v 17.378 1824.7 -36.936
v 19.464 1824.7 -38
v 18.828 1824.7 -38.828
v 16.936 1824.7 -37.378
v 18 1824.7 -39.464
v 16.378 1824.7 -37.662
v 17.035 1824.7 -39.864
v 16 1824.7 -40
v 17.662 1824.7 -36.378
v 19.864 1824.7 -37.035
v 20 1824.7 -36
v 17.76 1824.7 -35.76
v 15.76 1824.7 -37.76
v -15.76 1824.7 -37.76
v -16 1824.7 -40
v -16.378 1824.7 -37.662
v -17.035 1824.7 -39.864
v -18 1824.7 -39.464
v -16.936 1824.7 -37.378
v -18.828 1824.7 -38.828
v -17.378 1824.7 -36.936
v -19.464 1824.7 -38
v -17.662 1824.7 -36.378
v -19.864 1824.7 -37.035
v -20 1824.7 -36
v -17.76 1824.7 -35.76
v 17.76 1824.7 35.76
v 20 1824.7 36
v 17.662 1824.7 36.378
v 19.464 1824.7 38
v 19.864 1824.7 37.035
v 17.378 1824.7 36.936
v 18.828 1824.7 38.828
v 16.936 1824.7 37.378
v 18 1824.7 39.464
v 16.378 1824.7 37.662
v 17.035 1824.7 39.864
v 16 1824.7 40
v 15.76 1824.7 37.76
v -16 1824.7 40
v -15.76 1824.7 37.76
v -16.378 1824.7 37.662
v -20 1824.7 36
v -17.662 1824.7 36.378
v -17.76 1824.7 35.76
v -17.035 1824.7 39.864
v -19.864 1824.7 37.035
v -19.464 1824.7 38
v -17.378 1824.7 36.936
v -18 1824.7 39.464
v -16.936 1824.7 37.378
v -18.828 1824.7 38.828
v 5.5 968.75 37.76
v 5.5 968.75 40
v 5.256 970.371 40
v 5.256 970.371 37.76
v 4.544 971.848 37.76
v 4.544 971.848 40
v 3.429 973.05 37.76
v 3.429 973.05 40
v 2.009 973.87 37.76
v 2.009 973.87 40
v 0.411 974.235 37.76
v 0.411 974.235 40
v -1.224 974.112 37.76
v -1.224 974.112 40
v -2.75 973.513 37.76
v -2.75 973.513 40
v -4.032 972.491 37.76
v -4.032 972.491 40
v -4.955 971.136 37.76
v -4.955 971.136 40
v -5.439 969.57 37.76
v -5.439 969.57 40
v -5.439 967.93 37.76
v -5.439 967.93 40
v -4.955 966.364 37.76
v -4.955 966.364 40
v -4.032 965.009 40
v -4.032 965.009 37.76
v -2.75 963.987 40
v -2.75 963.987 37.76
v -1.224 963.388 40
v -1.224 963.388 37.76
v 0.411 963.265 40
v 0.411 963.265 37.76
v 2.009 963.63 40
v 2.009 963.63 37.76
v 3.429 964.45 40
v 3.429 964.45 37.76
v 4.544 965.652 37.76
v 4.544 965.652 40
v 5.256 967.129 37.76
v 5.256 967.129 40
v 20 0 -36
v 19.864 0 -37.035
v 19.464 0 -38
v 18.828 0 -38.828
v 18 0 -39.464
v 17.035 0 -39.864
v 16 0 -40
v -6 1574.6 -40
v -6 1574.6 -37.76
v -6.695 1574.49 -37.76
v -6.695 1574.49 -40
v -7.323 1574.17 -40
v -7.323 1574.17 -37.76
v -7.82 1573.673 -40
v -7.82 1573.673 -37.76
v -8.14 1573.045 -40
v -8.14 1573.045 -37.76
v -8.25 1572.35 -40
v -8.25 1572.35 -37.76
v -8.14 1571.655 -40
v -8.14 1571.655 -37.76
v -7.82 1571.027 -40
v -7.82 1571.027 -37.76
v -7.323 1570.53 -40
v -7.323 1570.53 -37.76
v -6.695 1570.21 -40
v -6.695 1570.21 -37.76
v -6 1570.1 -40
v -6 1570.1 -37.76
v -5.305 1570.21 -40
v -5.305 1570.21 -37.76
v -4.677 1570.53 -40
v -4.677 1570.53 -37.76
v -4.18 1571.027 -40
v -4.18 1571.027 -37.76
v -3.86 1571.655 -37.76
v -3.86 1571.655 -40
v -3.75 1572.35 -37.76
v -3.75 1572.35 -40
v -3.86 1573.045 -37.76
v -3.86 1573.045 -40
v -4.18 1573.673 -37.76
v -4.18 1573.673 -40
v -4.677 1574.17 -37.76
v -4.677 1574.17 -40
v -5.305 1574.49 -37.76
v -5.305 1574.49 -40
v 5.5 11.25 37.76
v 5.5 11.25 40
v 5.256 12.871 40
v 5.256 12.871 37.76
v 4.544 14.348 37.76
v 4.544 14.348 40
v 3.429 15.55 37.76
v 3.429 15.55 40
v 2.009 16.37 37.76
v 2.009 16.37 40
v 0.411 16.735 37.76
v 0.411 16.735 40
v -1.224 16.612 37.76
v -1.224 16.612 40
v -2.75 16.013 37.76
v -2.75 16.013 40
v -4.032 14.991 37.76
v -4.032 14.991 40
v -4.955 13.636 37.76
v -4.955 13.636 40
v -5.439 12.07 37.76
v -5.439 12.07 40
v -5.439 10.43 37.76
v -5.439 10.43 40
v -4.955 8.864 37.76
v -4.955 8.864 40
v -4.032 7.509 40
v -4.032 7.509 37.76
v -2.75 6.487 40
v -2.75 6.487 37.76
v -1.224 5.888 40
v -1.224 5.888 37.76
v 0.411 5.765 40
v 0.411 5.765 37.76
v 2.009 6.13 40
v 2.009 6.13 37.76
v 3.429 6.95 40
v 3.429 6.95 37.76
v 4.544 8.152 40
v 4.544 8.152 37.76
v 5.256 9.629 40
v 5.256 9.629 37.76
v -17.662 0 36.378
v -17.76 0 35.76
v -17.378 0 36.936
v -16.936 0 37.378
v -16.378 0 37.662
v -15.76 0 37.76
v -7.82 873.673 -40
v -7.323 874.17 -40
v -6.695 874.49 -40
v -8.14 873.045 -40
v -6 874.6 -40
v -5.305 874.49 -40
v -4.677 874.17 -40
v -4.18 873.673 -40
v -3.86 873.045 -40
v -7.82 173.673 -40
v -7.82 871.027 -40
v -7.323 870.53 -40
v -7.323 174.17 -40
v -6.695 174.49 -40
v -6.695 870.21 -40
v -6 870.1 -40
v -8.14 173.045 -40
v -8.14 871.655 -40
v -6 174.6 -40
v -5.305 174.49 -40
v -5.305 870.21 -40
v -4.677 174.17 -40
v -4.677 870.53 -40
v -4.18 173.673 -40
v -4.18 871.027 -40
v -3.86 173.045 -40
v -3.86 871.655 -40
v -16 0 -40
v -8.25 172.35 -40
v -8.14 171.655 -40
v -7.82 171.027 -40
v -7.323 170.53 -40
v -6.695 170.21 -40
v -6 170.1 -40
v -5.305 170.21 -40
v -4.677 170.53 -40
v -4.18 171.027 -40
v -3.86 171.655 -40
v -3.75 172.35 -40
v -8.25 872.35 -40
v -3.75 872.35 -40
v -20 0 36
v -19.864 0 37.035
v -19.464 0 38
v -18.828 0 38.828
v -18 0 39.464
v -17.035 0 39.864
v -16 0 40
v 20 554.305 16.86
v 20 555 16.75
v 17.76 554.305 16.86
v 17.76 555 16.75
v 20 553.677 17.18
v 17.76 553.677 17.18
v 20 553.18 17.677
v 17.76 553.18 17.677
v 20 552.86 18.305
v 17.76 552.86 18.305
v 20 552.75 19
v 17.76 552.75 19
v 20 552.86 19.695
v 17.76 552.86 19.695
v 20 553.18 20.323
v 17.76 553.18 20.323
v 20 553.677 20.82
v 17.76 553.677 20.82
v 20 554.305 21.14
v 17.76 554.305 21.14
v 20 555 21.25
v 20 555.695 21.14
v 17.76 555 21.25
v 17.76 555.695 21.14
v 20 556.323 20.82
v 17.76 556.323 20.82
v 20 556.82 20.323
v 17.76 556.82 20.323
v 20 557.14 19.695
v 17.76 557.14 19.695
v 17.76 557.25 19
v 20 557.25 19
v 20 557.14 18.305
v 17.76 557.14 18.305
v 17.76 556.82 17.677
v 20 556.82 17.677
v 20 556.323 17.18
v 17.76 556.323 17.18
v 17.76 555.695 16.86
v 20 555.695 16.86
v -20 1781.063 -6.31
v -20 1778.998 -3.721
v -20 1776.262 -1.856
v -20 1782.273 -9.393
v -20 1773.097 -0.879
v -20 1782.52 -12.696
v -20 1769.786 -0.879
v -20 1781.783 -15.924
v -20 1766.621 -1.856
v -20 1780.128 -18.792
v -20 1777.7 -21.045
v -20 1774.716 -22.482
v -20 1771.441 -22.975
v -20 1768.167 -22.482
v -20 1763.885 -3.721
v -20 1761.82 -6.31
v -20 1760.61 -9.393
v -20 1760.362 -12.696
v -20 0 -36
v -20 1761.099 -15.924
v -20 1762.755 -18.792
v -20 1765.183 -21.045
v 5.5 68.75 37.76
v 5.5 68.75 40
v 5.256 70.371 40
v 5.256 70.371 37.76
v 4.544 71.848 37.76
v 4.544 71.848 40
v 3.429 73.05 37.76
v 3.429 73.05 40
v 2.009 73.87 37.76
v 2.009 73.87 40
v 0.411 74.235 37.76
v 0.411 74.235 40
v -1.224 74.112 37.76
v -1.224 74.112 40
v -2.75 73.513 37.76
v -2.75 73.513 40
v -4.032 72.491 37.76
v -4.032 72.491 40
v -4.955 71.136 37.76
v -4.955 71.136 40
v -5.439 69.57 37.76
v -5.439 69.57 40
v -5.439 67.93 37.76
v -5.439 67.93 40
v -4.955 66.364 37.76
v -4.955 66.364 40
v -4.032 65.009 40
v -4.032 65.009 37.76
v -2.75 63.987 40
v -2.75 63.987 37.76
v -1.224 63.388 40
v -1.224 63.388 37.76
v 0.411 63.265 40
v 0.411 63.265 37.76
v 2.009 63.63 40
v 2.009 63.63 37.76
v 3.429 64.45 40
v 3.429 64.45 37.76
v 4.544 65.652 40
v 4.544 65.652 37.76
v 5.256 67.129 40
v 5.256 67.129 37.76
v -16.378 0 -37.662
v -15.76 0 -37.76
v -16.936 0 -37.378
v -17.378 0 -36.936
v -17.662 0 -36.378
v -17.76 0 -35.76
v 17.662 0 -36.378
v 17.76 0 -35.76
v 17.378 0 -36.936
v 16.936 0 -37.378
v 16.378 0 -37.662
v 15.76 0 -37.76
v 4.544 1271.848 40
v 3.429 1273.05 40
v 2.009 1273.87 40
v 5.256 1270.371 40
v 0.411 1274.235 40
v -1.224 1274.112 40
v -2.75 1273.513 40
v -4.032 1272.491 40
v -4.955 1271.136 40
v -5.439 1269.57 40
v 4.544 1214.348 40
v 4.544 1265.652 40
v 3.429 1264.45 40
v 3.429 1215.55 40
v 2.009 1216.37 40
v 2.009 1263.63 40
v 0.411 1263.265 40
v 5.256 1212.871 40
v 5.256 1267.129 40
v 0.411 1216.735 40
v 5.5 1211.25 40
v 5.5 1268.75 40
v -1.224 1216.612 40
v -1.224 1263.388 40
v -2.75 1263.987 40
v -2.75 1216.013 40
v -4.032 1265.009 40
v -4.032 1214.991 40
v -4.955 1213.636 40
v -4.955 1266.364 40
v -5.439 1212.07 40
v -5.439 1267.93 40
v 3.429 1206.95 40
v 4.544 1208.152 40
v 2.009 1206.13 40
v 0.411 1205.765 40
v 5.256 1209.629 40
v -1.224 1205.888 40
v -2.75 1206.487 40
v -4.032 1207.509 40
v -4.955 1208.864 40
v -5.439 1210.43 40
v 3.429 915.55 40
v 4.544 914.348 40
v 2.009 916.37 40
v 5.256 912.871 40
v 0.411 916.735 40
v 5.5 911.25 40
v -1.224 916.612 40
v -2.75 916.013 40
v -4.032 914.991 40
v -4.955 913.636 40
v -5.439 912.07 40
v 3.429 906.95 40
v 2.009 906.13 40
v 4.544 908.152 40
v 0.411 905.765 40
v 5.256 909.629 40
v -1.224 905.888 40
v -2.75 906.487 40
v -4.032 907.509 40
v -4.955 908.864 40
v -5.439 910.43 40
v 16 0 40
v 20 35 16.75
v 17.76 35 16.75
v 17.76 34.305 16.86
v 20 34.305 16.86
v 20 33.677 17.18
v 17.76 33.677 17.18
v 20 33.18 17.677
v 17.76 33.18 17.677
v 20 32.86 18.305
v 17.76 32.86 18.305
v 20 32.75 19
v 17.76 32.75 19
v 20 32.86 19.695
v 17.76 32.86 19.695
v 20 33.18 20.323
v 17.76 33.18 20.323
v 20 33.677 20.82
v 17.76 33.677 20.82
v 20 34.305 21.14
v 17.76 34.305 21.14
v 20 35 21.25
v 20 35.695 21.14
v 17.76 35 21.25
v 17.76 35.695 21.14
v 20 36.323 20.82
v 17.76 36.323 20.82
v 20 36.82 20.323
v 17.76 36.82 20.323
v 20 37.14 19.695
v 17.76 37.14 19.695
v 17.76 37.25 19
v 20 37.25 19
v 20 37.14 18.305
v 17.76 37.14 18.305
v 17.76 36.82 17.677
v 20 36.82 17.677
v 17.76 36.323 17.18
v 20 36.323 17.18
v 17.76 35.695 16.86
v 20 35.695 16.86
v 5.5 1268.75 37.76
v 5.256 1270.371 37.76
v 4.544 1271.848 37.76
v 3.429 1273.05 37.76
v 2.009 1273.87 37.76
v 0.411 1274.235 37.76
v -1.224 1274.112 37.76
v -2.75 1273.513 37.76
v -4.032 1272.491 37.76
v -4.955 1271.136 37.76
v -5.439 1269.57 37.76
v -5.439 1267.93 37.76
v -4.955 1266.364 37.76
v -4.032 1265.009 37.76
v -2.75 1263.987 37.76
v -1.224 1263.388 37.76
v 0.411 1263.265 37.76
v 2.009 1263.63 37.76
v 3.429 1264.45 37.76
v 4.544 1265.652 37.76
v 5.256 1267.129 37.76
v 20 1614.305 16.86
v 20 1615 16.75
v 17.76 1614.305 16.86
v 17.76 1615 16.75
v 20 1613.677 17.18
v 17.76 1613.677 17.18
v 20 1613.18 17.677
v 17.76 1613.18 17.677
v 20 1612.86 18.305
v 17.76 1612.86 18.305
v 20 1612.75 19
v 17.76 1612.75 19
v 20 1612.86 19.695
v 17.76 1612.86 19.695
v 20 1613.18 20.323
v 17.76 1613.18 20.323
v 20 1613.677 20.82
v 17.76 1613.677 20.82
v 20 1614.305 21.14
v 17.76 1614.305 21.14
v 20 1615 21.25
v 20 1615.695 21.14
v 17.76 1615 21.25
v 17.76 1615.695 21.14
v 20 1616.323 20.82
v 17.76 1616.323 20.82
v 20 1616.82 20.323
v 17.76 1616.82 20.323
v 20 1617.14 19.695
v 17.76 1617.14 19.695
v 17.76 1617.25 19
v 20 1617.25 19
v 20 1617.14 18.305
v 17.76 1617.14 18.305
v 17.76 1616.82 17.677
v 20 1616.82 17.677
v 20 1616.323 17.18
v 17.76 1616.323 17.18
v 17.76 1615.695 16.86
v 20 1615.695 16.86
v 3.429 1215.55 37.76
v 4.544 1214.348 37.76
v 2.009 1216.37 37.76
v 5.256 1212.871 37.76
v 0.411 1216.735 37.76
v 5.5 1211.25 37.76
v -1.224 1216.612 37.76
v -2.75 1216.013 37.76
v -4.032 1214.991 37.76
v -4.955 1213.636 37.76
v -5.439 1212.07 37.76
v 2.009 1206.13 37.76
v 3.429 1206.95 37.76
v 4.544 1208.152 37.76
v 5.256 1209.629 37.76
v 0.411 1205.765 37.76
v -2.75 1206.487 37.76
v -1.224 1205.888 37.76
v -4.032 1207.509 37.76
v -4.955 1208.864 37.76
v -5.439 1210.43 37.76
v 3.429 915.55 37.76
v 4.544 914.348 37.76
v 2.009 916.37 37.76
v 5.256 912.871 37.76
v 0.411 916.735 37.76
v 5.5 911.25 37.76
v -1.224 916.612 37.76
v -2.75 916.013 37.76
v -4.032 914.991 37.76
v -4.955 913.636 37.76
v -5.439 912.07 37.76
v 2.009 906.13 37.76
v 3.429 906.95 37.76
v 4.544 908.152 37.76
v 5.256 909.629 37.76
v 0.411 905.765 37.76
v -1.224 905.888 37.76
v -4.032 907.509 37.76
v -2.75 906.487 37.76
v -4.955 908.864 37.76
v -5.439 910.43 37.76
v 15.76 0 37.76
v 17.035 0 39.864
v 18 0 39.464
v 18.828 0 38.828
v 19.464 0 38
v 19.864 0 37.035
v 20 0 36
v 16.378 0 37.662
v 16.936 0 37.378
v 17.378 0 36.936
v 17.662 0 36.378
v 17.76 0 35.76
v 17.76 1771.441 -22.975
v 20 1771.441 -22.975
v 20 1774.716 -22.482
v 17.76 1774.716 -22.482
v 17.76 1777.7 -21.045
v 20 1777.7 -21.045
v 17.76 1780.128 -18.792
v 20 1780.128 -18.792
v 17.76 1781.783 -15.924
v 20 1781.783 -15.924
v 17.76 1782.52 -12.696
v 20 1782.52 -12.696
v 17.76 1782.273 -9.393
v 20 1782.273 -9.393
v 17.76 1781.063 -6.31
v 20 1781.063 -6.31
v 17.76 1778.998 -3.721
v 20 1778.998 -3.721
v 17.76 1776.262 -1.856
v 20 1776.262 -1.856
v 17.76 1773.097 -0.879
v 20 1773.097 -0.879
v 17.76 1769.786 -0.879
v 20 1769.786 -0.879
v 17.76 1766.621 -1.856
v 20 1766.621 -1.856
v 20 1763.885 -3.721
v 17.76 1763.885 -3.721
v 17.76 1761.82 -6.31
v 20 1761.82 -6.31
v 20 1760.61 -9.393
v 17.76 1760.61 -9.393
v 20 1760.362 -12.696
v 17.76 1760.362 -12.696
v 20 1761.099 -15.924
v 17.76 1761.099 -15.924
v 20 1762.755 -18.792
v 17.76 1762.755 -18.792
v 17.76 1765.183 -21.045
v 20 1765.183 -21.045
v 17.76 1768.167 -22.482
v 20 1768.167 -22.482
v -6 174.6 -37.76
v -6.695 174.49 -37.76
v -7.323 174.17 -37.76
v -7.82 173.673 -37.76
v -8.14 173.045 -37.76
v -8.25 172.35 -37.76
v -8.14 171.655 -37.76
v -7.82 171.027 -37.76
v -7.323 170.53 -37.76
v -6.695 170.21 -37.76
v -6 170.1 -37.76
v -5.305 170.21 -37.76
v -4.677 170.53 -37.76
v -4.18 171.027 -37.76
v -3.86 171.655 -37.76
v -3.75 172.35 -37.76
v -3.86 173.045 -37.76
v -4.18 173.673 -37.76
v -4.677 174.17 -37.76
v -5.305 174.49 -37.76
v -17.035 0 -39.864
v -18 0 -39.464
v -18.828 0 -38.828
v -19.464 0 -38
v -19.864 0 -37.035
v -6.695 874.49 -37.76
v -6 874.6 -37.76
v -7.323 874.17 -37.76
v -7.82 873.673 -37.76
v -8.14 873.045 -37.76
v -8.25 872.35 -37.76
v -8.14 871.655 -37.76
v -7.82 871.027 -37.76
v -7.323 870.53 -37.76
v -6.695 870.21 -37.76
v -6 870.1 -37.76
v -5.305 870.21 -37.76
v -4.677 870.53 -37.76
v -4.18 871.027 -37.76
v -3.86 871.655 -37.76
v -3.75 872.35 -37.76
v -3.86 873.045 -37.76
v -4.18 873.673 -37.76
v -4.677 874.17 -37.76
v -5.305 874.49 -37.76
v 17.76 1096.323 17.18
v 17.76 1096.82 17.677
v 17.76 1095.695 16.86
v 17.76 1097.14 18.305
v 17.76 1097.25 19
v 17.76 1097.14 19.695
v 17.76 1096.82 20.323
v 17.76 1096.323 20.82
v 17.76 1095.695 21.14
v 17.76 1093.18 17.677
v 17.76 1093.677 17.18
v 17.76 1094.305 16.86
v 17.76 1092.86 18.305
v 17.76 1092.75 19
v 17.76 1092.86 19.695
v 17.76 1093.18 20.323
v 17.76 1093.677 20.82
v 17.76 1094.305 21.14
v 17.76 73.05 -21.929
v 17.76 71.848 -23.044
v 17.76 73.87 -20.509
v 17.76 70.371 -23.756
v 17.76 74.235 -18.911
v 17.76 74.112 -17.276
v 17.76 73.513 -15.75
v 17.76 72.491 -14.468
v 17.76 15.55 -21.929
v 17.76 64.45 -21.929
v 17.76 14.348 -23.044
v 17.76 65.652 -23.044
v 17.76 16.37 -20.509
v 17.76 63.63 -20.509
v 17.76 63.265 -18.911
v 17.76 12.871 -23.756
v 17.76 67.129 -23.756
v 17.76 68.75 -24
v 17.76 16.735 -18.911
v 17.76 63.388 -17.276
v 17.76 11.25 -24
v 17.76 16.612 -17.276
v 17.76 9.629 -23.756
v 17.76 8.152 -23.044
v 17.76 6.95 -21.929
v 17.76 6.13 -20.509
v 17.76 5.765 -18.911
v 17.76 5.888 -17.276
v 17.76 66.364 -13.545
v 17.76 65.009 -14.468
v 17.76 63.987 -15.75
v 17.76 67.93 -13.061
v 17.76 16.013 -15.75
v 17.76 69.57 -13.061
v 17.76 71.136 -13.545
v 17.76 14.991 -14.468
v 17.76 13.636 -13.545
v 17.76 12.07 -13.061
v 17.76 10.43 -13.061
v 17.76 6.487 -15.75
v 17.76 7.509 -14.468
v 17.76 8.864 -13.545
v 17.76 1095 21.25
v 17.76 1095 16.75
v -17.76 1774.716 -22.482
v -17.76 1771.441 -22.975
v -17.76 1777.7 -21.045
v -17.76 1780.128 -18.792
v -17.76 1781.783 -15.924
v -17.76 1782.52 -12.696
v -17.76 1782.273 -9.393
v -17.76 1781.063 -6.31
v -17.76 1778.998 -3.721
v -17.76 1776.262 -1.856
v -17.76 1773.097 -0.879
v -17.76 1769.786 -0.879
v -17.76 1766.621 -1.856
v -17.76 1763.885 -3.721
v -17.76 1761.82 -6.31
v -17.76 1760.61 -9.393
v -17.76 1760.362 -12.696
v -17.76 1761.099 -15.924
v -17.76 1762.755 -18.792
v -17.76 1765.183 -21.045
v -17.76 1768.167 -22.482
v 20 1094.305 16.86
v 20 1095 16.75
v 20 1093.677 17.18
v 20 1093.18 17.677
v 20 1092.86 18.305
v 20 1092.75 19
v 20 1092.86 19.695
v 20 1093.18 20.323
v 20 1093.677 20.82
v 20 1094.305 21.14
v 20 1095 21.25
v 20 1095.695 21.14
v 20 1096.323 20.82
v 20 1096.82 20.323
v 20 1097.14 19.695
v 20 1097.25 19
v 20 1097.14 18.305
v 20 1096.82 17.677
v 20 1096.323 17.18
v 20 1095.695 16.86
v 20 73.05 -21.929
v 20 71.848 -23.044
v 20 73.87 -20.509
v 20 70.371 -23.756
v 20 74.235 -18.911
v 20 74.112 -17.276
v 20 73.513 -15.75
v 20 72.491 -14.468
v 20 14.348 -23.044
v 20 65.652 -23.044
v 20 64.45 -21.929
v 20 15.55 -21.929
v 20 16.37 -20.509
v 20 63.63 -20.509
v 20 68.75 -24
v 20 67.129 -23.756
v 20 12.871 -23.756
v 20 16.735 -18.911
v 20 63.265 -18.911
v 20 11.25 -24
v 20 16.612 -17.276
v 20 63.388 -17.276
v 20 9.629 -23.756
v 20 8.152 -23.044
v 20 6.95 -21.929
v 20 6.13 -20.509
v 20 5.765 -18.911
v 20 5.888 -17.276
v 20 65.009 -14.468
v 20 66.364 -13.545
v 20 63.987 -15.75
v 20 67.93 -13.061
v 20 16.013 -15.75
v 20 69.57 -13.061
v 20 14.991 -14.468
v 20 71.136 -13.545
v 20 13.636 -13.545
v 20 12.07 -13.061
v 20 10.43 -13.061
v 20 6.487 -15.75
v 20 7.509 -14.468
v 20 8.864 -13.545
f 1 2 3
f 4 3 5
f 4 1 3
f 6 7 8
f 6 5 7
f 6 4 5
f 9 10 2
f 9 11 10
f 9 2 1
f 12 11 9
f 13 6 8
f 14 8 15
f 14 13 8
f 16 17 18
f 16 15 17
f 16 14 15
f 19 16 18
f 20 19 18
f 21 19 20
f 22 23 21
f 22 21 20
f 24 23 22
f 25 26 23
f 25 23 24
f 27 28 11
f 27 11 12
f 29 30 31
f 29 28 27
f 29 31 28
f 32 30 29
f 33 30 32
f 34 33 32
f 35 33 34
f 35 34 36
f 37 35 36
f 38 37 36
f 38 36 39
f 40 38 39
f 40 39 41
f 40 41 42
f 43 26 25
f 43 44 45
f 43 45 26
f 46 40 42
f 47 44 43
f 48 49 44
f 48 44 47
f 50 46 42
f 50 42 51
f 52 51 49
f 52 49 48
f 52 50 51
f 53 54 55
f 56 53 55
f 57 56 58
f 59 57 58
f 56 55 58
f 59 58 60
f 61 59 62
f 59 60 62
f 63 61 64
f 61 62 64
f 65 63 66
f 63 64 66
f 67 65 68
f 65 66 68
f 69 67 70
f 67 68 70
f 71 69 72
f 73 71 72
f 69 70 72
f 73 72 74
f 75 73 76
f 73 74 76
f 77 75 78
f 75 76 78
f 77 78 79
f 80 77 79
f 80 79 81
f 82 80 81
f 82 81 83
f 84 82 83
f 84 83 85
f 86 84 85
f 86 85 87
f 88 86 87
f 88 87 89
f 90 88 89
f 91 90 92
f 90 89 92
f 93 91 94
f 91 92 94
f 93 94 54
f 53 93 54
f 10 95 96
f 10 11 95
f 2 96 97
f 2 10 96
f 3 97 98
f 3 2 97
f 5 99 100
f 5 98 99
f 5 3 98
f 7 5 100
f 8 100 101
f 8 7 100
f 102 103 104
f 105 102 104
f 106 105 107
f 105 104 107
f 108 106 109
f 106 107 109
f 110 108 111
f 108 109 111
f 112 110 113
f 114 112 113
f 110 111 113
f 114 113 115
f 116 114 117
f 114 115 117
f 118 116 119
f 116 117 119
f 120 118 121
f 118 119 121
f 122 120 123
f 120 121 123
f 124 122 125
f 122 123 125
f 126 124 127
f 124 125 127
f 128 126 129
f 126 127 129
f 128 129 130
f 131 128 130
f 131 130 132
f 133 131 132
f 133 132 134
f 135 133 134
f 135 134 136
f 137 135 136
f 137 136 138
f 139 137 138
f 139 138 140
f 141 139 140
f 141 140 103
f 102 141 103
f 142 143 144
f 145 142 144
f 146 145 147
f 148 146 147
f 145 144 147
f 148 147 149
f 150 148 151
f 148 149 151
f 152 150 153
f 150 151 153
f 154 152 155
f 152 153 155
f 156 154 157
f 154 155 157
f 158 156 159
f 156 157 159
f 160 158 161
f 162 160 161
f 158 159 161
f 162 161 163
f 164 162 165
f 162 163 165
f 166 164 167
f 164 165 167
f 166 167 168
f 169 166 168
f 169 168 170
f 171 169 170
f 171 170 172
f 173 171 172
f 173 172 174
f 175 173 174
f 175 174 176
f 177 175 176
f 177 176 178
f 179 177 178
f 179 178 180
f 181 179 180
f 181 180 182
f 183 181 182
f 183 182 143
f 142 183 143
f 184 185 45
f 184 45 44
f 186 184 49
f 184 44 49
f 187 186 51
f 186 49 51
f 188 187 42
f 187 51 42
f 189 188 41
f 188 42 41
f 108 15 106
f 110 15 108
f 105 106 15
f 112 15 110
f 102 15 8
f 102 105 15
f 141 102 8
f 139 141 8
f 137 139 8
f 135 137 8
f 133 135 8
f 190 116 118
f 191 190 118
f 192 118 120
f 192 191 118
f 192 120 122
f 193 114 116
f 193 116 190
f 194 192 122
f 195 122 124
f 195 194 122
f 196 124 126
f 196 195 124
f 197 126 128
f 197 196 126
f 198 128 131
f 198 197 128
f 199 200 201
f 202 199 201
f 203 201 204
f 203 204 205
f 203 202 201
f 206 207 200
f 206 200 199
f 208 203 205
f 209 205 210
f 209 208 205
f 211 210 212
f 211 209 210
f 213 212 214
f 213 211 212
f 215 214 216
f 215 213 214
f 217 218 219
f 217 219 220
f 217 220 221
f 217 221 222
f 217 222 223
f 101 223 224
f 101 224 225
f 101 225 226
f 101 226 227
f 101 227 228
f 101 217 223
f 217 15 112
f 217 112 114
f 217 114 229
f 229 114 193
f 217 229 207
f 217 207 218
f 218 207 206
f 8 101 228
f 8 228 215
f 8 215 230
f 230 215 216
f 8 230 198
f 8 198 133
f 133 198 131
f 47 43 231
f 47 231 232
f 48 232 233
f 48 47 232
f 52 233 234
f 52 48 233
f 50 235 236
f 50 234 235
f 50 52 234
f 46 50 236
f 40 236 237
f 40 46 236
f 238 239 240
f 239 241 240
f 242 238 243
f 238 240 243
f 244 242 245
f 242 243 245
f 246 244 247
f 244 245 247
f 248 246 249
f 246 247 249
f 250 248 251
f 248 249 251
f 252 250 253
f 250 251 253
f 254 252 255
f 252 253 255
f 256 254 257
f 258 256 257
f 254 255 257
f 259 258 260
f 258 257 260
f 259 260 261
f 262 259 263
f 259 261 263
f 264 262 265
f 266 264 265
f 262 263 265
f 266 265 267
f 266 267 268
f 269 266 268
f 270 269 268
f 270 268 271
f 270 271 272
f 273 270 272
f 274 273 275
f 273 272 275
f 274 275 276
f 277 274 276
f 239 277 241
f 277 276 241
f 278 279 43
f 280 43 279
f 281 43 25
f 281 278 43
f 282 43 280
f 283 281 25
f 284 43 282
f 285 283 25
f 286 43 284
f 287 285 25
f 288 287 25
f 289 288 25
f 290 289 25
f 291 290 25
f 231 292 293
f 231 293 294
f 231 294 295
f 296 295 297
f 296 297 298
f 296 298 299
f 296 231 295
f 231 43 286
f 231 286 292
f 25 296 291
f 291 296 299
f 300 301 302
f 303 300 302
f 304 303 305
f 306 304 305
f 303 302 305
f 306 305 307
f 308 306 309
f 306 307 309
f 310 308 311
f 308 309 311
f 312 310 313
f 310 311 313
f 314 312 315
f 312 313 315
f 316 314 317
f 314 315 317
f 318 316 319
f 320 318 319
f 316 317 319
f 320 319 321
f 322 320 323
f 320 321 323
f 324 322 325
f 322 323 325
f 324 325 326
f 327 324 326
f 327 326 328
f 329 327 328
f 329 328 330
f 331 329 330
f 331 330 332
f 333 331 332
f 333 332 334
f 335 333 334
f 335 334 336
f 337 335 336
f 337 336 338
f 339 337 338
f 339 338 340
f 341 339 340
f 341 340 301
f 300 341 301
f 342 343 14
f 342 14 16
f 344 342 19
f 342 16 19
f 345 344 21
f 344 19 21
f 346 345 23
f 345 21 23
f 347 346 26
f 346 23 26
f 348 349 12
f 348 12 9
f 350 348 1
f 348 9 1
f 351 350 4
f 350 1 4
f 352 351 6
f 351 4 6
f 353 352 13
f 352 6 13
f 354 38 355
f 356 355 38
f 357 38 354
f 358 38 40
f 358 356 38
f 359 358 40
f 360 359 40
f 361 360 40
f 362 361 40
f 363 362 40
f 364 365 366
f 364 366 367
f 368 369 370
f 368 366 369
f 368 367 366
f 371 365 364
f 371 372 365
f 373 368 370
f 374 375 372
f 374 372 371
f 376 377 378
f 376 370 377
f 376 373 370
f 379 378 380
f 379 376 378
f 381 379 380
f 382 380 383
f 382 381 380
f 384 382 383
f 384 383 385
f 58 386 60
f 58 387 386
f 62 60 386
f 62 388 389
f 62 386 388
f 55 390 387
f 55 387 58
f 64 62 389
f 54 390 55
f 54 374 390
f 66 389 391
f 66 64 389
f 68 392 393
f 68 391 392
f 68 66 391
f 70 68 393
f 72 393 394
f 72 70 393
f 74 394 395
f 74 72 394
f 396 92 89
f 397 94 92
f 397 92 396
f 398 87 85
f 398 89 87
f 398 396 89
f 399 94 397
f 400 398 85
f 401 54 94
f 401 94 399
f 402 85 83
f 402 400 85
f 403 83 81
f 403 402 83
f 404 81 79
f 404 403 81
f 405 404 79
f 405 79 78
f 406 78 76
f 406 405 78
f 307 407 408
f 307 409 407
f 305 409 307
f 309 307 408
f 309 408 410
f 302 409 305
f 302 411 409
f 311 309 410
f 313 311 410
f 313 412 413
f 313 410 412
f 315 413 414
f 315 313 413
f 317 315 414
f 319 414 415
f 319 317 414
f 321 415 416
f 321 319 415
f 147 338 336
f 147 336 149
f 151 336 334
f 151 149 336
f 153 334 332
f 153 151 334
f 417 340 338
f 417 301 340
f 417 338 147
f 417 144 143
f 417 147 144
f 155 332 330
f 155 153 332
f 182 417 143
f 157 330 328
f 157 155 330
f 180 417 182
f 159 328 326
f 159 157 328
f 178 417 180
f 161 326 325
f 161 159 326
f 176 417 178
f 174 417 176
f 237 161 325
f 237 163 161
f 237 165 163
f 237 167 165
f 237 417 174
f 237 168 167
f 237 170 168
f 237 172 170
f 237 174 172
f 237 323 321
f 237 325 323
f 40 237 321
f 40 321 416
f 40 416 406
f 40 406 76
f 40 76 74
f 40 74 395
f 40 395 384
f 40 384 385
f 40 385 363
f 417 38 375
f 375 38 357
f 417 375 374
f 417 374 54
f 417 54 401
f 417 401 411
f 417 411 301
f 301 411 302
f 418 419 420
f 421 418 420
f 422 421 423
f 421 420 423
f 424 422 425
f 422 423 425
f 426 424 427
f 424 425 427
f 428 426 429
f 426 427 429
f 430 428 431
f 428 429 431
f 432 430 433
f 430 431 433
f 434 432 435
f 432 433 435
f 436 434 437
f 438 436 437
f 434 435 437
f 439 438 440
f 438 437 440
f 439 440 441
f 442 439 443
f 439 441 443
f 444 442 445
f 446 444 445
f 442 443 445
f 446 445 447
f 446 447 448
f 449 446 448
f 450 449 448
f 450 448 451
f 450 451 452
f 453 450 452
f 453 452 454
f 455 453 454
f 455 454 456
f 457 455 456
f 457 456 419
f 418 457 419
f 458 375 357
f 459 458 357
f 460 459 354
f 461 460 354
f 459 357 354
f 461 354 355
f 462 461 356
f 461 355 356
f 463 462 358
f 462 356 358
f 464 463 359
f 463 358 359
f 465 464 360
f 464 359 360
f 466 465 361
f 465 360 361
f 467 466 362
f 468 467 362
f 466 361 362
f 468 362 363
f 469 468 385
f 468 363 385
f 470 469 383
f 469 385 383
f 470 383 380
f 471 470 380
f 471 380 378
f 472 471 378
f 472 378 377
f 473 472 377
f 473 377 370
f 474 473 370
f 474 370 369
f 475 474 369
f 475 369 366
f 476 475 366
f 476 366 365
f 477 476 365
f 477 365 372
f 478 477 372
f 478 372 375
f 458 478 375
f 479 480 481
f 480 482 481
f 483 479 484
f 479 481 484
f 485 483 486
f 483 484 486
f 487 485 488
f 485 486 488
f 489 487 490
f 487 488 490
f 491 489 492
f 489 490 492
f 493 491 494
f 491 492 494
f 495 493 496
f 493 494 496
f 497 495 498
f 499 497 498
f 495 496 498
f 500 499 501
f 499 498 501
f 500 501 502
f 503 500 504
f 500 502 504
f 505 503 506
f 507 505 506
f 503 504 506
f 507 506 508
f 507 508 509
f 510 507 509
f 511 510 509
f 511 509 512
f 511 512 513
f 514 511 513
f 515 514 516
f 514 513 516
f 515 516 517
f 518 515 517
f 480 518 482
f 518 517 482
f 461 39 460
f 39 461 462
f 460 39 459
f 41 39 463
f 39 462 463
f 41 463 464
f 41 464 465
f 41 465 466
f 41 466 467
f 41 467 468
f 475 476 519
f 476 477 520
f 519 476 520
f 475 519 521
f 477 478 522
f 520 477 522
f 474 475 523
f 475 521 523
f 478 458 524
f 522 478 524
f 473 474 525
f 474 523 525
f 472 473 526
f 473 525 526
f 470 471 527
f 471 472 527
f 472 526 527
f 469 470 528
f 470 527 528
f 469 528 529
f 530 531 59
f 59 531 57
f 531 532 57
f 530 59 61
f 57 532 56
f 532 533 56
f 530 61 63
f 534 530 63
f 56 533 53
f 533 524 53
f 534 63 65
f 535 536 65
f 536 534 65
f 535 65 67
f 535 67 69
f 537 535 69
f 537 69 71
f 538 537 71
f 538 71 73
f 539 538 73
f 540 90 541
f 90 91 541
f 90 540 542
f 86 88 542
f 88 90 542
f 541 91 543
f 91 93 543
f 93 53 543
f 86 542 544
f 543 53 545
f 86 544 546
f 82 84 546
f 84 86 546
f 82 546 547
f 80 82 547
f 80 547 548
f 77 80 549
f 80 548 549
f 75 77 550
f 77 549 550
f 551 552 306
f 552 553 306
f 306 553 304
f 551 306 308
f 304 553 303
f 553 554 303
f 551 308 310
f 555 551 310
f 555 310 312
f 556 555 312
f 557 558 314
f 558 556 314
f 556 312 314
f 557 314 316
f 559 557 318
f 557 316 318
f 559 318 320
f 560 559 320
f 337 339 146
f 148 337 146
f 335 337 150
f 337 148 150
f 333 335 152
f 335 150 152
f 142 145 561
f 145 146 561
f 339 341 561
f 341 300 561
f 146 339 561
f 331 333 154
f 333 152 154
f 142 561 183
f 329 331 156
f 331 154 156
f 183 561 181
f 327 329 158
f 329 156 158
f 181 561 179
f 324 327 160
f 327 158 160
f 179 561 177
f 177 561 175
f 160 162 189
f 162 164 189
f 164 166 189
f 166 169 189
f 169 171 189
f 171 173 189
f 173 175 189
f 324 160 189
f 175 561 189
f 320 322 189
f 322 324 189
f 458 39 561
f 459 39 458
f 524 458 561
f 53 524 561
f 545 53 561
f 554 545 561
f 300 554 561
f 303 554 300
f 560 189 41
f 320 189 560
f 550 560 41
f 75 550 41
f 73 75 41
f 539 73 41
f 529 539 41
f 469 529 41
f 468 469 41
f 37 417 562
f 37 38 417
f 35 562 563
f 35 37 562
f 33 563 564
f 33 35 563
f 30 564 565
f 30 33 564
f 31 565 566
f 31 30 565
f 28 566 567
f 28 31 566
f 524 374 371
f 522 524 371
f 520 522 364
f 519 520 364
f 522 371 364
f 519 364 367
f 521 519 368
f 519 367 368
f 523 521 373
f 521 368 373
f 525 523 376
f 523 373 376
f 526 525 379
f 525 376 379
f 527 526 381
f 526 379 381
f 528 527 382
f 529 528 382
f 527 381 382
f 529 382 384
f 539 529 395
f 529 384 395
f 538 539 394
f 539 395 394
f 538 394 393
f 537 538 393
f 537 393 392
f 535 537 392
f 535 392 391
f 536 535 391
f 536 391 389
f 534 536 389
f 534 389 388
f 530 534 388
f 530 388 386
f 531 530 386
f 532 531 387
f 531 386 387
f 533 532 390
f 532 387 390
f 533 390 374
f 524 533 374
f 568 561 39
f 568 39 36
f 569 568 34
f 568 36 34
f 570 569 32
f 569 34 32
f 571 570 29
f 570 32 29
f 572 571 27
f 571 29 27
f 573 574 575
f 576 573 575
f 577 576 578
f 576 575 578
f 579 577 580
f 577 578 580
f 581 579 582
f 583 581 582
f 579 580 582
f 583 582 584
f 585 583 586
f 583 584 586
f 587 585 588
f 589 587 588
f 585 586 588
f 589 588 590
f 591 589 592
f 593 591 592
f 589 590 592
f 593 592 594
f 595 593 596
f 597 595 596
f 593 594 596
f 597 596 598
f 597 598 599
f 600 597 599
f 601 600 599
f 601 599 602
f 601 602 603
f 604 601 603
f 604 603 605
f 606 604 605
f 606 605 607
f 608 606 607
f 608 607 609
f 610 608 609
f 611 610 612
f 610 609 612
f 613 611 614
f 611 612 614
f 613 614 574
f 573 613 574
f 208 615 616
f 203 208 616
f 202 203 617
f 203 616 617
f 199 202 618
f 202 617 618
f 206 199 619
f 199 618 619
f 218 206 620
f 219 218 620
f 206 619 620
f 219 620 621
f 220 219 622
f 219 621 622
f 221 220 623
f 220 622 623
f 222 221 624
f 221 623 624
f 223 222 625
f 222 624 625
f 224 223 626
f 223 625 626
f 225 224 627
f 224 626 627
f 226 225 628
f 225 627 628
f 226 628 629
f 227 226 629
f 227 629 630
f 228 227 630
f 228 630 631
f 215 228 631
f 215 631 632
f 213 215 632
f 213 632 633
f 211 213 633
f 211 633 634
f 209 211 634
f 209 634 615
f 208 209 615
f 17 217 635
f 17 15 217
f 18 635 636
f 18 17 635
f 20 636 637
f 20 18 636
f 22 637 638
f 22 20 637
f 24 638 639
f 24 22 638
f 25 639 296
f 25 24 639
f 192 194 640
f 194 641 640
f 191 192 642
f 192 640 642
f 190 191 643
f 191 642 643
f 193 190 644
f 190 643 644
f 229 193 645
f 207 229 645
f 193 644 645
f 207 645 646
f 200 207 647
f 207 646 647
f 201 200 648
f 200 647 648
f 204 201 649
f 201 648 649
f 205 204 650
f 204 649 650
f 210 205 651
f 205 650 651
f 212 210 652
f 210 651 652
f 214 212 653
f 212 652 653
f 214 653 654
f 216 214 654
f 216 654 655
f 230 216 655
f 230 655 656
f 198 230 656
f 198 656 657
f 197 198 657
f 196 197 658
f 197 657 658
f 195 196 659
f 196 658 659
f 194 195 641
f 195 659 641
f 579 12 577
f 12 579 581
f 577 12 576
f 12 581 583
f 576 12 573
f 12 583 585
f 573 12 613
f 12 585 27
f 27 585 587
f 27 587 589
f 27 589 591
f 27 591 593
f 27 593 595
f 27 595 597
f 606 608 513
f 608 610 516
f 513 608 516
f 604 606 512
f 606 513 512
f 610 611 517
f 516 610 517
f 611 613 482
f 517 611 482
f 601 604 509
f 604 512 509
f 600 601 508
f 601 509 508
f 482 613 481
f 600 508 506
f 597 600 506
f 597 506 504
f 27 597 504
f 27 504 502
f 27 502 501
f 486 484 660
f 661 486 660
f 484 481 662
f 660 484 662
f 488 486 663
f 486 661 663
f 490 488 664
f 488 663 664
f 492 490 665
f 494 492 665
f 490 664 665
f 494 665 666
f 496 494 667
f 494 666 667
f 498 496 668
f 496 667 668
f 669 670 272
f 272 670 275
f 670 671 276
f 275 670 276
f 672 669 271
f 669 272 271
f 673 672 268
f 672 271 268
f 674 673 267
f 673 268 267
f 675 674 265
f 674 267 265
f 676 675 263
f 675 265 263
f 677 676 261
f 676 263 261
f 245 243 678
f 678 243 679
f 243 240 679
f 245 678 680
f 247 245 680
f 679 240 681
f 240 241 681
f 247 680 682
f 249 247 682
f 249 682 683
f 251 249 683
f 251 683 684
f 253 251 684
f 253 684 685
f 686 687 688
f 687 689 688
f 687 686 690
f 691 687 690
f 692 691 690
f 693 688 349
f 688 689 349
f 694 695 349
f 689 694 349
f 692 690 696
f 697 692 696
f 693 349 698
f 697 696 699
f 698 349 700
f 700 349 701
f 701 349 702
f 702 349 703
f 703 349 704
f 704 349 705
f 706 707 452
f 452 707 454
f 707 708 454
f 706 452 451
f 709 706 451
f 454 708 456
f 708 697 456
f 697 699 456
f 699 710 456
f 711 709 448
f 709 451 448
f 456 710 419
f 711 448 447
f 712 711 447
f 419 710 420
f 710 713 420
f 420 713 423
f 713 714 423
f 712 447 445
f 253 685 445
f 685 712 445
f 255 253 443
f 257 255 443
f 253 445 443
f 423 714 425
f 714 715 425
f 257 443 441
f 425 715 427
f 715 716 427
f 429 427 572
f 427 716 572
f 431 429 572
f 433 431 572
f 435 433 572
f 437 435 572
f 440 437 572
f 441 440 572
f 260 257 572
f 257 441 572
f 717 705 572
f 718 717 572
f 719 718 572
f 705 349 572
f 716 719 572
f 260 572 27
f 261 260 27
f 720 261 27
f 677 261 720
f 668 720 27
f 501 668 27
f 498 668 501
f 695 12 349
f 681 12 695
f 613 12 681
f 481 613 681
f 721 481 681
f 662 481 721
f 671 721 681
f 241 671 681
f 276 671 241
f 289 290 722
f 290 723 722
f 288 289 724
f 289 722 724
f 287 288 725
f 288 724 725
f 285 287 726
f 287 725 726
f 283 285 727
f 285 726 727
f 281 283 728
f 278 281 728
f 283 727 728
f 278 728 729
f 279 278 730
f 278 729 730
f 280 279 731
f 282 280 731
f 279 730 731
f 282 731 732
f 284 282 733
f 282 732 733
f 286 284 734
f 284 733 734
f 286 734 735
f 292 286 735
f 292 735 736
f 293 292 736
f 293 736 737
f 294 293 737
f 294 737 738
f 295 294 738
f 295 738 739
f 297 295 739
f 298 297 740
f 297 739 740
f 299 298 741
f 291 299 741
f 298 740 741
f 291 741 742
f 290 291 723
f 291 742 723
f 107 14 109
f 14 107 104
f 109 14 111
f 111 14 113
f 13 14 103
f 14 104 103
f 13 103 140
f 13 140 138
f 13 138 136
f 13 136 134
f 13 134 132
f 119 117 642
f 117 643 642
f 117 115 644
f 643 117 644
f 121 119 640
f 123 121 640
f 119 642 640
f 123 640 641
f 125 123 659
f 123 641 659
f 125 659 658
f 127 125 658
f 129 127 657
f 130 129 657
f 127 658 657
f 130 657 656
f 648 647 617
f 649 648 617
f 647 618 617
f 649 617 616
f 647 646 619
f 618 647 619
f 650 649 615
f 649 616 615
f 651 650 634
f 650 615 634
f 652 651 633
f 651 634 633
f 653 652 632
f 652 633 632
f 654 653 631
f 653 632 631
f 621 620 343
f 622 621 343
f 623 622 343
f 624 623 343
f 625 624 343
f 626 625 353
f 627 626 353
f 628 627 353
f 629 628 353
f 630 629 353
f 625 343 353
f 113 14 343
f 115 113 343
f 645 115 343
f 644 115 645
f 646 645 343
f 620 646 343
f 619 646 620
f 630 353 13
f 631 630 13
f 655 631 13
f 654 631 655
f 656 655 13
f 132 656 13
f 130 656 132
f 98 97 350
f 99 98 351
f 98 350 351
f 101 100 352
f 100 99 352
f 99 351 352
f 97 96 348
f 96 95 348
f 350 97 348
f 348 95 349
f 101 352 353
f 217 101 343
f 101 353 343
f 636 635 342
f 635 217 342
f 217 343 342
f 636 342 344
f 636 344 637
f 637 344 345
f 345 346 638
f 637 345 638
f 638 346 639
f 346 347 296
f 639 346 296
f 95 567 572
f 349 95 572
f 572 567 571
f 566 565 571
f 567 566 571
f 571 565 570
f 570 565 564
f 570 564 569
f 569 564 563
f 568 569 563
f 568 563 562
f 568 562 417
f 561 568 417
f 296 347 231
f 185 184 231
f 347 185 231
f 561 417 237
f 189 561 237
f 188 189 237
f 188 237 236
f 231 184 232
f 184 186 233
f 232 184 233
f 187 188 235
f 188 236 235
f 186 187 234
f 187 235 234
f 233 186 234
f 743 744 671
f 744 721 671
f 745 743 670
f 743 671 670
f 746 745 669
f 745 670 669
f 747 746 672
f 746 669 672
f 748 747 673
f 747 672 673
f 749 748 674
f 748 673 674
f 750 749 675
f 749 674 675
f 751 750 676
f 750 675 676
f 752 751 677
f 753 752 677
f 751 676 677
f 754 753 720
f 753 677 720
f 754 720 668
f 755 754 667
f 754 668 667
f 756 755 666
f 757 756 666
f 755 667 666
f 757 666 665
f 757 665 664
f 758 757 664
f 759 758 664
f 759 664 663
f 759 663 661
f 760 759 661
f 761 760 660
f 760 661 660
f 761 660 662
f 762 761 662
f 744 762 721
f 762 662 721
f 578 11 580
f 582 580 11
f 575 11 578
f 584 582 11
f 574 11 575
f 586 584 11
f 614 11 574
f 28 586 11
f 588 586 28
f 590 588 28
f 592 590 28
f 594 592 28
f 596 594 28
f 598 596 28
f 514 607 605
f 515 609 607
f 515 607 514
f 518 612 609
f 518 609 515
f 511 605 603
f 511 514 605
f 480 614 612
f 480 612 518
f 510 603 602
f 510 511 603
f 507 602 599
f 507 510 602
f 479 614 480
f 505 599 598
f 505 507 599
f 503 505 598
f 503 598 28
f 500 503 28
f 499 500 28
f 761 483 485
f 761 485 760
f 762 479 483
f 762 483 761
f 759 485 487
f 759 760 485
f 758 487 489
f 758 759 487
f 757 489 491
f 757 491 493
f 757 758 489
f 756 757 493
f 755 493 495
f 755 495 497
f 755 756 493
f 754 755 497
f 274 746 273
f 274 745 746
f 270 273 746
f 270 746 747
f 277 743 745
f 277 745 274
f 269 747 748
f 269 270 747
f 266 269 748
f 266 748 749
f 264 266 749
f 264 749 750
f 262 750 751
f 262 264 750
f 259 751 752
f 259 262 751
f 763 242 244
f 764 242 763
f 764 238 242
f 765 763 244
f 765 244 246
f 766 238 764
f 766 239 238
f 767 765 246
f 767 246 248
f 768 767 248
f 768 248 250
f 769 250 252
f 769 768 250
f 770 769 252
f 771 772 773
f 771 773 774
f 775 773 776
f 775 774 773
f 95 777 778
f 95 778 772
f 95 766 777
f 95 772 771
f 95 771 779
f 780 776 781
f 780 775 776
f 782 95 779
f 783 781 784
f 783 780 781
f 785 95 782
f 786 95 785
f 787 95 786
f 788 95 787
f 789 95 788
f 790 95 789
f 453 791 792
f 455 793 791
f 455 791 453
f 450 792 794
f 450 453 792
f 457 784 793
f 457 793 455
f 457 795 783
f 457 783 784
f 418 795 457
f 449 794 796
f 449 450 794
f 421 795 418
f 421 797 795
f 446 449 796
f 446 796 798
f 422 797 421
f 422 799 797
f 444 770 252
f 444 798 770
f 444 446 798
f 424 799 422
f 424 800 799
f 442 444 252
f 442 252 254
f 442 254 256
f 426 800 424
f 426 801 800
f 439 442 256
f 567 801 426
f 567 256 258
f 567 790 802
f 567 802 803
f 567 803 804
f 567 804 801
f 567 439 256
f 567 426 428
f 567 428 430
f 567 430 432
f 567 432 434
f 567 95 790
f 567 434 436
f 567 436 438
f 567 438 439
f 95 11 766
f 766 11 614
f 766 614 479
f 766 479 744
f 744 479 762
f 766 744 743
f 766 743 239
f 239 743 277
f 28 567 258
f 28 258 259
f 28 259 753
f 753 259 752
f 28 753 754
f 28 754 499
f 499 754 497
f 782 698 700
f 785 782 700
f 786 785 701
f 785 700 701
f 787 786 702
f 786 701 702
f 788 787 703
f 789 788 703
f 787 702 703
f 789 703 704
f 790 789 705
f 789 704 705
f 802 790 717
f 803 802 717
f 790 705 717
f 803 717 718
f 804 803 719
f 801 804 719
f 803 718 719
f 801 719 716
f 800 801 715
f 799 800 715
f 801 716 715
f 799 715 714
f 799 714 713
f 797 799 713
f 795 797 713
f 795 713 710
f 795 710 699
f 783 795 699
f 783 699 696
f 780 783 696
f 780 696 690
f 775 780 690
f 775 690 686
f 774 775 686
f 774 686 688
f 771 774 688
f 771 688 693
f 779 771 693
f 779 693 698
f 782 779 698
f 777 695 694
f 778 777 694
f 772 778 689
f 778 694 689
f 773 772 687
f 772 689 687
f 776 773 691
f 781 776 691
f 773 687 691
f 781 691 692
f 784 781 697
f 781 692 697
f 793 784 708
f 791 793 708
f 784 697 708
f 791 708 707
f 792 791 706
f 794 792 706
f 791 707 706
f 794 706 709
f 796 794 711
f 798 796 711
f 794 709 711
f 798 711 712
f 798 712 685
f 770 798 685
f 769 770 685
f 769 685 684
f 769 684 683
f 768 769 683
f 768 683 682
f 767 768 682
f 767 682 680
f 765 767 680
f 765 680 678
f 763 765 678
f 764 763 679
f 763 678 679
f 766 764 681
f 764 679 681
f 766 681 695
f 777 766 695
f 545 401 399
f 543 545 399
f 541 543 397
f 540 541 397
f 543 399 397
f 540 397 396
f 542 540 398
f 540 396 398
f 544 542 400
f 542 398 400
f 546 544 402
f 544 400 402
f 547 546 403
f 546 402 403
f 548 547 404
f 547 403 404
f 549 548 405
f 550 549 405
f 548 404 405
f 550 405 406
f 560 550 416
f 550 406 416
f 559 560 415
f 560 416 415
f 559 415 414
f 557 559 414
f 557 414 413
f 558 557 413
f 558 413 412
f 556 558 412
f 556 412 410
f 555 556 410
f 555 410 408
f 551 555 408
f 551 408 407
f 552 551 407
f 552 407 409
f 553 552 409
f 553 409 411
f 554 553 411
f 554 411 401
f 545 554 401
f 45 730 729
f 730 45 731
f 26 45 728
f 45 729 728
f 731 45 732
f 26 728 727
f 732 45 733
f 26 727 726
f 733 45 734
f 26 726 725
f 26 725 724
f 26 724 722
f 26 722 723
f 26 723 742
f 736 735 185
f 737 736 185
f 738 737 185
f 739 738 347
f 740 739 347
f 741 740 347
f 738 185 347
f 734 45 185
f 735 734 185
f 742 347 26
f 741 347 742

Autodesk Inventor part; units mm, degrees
ref_plane "YZ Plane" through (0, 0, 0) normal (1, 0, 0) x (0, 1, 0)
ref_plane "XZ Plane" through (0, 0, 0) normal (0, 1, 0) x (-1, 0, 0)
ref_plane "XY Plane" through (0, 0, 0) normal (0, 0, 1) x (1, 0, 0)
sketch "Sketch1" plane through (0, 0, 0) normal (0, 1, 0) x (-1, 0, 0)
  line L0 (-20, 40) -> (20, 40)
  line L1 (20, 40) -> (20, -40)
  line L2 (20, -40) -> (-20, -40)
  line L3 (-20, -40) -> (-20, 40)
  line L4 (-20, 40) -> (20, -40) construction
  line L5 (20, 40) -> (-20, -40) construction
  line L6 (-17.76, 37.76) -> (17.76, 37.76)
  line L7 (17.76, 37.76) -> (17.76, -37.76)
  line L8 (17.76, -37.76) -> (-17.76, -37.76)
  line L9 (-17.76, -37.76) -> (-17.76, 37.76)
  line L10 (-17.76, 37.76) -> (17.76, -37.76) construction
  line L11 (17.76, 37.76) -> (-17.76, -37.76) construction
  point P0 (0, 0)
  dimension "d0" = 40
  dimension "d1" = 80
  dimension "d2" = 35.52
  dimension "d10" = 2.24
extrude "Extrusion1" add sketch "Sketch1" along normal blind 1824.7
fillet "Fillet1" radius 2 4 edges at (-17.76, 912.35, 37.76) (17.76, 912.35, -37.76) (17.76, 912.35, 37.76) (-17.76, 912.35, -37.76)
fillet "Fillet1" radius 4 4 edges at (20, 912.35, 40) (-20, 912.35, 40) (20, 912.35, -40) (-20, 912.35, -40)
sketch "Boceto3" plane through (-16, 0, 40) normal (0, 0, 1) x (1, 0, 0)
  circle A0 centre (16, 11.25) radius 4.5 projected
  circle A1 centre (16, 68.75) radius 4.5 projected
  circle A2 centre (16, 911.25) radius 4.5 projected
  circle A3 centre (16, 968.75) radius 4.5 projected
  circle A4 centre (16, 1268.75) radius 4.5 projected
  circle A5 centre (16, 1211.25) radius 4.5 projected
  circle A6 centre (16, 968.75) radius 5.5
  circle A7 centre (16, 911.25) radius 5.5
  circle A8 centre (16, 68.75) radius 5.5
  circle A9 centre (16, 11.25) radius 5.5
  circle A10 centre (16, 1268.75) radius 5.5
  circle A11 centre (16, 1211.25) radius 5.5
  point P0 (16, 0)
  dimension "d11" = 11
  dimension "d12" = 11
  dimension "d13" = 11
  dimension "d14" = 11
  dimension "d15" = 11
  dimension "d16" = 11
extrude "Extrusión3" cut sketch "Boceto3" against normal blind 10 contours A0 | A1 | A2 | A3 | A4 | A5 | A6 | A7 | A8 | A9 | A10 | A11
sketch "Sketch8" plane through (20, 0, 36) normal (1, 0, 0) x (0, 0, -1)
  circle A0 centre (47.8654, 1771.4414) radius 11.11 projected
  point P0 (36, 0)
extrude "Extrusion7" cut sketch "Sketch8" against normal through all
sketch "Sketch12" plane through (20, 0, 36) normal (1, 0, 0) x (0, 0, -1)
  line L0 (76, 1824.7) -> (76, 0) projected
  line L1 (76, 0) -> (17, 0)
  line L2 (0, 0) -> (72, 0) projected
  line L3 (17, 0) -> (17, 35)
  line L4 (17, 0) -> (17, 555)
  line L5 (17, 0) -> (17, 1095)
  line L6 (17, 0) -> (17, 1615)
  point P0 (36, 0)
  dimension "d37" = 59
  dimension "d38" = 35
  dimension "d39" = 555
  dimension "d40" = 1095
  dimension "d41" = 1615
hole "Hole1" at (20, 35, 19) at (20, 555, 19) at (20, 1095, 19) at (20, 1615, 19) direction (-1, 0, 0) diameter 4.5 depth 8 tip angle 118 clearance for "Countersunk Flat Head Screw ISO 2009/7046" size "M4" standard "ISO"
sketch "Sketch13" plane through (20, 0, 36) normal (1, 0, 0) x (0, 0, -1)
  circle A0 centre (54.5, 11.25) radius 3.3234 projected
  circle A1 centre (54.5, 68.75) radius 3.3234 projected
  point P0 (36, 0)
hole "Hole2" at (20, 11.25, -18.5) at (20, 68.75, -18.5) direction (-1, 0, 0) diameter 11 depth 8
sketch "Sketch15" plane through (-16, 0, -40) normal (0, 0, -1) x (-1, 0, 0)
  line L0 (-10, 0) -> (-10, 80)
  line L1 (-10, 0) -> (70, 0) construction
  line L2 (4, 0) -> (4, 1824.7) construction
  line L3 (4, 80) -> (-32.0092, 80) construction
  line L4 (-10, 80) -> (-10, 1664.7)
  line L5 (-10, 872.35) -> (-10, 1572.35)
  line L6 (-10, 872.35) -> (-5, 872.35)
  point P0 (-16, 0)
  point P1 (-10, 172.35)
  dimension "d56" = 80
  dimension "d57" = 90
  dimension "d58" = 14
  dimension "d59" = 700
  dimension "d60" = 5
  dimension "d68" = 792.35
hole "Hole3" at (-6, 172.35, -40) at (-6, 872.35, -40) at (-6, 1572.35, -40) direction (0, 0, 1) diameter 4.5 depth 8 clearance for "Countersunk Flat Head Screw ISO 2009/7046" size "M4" standard "ISO"
properties part number "SP43V1 Tubo 40x80x1825mm" material "Acero, carbono"
